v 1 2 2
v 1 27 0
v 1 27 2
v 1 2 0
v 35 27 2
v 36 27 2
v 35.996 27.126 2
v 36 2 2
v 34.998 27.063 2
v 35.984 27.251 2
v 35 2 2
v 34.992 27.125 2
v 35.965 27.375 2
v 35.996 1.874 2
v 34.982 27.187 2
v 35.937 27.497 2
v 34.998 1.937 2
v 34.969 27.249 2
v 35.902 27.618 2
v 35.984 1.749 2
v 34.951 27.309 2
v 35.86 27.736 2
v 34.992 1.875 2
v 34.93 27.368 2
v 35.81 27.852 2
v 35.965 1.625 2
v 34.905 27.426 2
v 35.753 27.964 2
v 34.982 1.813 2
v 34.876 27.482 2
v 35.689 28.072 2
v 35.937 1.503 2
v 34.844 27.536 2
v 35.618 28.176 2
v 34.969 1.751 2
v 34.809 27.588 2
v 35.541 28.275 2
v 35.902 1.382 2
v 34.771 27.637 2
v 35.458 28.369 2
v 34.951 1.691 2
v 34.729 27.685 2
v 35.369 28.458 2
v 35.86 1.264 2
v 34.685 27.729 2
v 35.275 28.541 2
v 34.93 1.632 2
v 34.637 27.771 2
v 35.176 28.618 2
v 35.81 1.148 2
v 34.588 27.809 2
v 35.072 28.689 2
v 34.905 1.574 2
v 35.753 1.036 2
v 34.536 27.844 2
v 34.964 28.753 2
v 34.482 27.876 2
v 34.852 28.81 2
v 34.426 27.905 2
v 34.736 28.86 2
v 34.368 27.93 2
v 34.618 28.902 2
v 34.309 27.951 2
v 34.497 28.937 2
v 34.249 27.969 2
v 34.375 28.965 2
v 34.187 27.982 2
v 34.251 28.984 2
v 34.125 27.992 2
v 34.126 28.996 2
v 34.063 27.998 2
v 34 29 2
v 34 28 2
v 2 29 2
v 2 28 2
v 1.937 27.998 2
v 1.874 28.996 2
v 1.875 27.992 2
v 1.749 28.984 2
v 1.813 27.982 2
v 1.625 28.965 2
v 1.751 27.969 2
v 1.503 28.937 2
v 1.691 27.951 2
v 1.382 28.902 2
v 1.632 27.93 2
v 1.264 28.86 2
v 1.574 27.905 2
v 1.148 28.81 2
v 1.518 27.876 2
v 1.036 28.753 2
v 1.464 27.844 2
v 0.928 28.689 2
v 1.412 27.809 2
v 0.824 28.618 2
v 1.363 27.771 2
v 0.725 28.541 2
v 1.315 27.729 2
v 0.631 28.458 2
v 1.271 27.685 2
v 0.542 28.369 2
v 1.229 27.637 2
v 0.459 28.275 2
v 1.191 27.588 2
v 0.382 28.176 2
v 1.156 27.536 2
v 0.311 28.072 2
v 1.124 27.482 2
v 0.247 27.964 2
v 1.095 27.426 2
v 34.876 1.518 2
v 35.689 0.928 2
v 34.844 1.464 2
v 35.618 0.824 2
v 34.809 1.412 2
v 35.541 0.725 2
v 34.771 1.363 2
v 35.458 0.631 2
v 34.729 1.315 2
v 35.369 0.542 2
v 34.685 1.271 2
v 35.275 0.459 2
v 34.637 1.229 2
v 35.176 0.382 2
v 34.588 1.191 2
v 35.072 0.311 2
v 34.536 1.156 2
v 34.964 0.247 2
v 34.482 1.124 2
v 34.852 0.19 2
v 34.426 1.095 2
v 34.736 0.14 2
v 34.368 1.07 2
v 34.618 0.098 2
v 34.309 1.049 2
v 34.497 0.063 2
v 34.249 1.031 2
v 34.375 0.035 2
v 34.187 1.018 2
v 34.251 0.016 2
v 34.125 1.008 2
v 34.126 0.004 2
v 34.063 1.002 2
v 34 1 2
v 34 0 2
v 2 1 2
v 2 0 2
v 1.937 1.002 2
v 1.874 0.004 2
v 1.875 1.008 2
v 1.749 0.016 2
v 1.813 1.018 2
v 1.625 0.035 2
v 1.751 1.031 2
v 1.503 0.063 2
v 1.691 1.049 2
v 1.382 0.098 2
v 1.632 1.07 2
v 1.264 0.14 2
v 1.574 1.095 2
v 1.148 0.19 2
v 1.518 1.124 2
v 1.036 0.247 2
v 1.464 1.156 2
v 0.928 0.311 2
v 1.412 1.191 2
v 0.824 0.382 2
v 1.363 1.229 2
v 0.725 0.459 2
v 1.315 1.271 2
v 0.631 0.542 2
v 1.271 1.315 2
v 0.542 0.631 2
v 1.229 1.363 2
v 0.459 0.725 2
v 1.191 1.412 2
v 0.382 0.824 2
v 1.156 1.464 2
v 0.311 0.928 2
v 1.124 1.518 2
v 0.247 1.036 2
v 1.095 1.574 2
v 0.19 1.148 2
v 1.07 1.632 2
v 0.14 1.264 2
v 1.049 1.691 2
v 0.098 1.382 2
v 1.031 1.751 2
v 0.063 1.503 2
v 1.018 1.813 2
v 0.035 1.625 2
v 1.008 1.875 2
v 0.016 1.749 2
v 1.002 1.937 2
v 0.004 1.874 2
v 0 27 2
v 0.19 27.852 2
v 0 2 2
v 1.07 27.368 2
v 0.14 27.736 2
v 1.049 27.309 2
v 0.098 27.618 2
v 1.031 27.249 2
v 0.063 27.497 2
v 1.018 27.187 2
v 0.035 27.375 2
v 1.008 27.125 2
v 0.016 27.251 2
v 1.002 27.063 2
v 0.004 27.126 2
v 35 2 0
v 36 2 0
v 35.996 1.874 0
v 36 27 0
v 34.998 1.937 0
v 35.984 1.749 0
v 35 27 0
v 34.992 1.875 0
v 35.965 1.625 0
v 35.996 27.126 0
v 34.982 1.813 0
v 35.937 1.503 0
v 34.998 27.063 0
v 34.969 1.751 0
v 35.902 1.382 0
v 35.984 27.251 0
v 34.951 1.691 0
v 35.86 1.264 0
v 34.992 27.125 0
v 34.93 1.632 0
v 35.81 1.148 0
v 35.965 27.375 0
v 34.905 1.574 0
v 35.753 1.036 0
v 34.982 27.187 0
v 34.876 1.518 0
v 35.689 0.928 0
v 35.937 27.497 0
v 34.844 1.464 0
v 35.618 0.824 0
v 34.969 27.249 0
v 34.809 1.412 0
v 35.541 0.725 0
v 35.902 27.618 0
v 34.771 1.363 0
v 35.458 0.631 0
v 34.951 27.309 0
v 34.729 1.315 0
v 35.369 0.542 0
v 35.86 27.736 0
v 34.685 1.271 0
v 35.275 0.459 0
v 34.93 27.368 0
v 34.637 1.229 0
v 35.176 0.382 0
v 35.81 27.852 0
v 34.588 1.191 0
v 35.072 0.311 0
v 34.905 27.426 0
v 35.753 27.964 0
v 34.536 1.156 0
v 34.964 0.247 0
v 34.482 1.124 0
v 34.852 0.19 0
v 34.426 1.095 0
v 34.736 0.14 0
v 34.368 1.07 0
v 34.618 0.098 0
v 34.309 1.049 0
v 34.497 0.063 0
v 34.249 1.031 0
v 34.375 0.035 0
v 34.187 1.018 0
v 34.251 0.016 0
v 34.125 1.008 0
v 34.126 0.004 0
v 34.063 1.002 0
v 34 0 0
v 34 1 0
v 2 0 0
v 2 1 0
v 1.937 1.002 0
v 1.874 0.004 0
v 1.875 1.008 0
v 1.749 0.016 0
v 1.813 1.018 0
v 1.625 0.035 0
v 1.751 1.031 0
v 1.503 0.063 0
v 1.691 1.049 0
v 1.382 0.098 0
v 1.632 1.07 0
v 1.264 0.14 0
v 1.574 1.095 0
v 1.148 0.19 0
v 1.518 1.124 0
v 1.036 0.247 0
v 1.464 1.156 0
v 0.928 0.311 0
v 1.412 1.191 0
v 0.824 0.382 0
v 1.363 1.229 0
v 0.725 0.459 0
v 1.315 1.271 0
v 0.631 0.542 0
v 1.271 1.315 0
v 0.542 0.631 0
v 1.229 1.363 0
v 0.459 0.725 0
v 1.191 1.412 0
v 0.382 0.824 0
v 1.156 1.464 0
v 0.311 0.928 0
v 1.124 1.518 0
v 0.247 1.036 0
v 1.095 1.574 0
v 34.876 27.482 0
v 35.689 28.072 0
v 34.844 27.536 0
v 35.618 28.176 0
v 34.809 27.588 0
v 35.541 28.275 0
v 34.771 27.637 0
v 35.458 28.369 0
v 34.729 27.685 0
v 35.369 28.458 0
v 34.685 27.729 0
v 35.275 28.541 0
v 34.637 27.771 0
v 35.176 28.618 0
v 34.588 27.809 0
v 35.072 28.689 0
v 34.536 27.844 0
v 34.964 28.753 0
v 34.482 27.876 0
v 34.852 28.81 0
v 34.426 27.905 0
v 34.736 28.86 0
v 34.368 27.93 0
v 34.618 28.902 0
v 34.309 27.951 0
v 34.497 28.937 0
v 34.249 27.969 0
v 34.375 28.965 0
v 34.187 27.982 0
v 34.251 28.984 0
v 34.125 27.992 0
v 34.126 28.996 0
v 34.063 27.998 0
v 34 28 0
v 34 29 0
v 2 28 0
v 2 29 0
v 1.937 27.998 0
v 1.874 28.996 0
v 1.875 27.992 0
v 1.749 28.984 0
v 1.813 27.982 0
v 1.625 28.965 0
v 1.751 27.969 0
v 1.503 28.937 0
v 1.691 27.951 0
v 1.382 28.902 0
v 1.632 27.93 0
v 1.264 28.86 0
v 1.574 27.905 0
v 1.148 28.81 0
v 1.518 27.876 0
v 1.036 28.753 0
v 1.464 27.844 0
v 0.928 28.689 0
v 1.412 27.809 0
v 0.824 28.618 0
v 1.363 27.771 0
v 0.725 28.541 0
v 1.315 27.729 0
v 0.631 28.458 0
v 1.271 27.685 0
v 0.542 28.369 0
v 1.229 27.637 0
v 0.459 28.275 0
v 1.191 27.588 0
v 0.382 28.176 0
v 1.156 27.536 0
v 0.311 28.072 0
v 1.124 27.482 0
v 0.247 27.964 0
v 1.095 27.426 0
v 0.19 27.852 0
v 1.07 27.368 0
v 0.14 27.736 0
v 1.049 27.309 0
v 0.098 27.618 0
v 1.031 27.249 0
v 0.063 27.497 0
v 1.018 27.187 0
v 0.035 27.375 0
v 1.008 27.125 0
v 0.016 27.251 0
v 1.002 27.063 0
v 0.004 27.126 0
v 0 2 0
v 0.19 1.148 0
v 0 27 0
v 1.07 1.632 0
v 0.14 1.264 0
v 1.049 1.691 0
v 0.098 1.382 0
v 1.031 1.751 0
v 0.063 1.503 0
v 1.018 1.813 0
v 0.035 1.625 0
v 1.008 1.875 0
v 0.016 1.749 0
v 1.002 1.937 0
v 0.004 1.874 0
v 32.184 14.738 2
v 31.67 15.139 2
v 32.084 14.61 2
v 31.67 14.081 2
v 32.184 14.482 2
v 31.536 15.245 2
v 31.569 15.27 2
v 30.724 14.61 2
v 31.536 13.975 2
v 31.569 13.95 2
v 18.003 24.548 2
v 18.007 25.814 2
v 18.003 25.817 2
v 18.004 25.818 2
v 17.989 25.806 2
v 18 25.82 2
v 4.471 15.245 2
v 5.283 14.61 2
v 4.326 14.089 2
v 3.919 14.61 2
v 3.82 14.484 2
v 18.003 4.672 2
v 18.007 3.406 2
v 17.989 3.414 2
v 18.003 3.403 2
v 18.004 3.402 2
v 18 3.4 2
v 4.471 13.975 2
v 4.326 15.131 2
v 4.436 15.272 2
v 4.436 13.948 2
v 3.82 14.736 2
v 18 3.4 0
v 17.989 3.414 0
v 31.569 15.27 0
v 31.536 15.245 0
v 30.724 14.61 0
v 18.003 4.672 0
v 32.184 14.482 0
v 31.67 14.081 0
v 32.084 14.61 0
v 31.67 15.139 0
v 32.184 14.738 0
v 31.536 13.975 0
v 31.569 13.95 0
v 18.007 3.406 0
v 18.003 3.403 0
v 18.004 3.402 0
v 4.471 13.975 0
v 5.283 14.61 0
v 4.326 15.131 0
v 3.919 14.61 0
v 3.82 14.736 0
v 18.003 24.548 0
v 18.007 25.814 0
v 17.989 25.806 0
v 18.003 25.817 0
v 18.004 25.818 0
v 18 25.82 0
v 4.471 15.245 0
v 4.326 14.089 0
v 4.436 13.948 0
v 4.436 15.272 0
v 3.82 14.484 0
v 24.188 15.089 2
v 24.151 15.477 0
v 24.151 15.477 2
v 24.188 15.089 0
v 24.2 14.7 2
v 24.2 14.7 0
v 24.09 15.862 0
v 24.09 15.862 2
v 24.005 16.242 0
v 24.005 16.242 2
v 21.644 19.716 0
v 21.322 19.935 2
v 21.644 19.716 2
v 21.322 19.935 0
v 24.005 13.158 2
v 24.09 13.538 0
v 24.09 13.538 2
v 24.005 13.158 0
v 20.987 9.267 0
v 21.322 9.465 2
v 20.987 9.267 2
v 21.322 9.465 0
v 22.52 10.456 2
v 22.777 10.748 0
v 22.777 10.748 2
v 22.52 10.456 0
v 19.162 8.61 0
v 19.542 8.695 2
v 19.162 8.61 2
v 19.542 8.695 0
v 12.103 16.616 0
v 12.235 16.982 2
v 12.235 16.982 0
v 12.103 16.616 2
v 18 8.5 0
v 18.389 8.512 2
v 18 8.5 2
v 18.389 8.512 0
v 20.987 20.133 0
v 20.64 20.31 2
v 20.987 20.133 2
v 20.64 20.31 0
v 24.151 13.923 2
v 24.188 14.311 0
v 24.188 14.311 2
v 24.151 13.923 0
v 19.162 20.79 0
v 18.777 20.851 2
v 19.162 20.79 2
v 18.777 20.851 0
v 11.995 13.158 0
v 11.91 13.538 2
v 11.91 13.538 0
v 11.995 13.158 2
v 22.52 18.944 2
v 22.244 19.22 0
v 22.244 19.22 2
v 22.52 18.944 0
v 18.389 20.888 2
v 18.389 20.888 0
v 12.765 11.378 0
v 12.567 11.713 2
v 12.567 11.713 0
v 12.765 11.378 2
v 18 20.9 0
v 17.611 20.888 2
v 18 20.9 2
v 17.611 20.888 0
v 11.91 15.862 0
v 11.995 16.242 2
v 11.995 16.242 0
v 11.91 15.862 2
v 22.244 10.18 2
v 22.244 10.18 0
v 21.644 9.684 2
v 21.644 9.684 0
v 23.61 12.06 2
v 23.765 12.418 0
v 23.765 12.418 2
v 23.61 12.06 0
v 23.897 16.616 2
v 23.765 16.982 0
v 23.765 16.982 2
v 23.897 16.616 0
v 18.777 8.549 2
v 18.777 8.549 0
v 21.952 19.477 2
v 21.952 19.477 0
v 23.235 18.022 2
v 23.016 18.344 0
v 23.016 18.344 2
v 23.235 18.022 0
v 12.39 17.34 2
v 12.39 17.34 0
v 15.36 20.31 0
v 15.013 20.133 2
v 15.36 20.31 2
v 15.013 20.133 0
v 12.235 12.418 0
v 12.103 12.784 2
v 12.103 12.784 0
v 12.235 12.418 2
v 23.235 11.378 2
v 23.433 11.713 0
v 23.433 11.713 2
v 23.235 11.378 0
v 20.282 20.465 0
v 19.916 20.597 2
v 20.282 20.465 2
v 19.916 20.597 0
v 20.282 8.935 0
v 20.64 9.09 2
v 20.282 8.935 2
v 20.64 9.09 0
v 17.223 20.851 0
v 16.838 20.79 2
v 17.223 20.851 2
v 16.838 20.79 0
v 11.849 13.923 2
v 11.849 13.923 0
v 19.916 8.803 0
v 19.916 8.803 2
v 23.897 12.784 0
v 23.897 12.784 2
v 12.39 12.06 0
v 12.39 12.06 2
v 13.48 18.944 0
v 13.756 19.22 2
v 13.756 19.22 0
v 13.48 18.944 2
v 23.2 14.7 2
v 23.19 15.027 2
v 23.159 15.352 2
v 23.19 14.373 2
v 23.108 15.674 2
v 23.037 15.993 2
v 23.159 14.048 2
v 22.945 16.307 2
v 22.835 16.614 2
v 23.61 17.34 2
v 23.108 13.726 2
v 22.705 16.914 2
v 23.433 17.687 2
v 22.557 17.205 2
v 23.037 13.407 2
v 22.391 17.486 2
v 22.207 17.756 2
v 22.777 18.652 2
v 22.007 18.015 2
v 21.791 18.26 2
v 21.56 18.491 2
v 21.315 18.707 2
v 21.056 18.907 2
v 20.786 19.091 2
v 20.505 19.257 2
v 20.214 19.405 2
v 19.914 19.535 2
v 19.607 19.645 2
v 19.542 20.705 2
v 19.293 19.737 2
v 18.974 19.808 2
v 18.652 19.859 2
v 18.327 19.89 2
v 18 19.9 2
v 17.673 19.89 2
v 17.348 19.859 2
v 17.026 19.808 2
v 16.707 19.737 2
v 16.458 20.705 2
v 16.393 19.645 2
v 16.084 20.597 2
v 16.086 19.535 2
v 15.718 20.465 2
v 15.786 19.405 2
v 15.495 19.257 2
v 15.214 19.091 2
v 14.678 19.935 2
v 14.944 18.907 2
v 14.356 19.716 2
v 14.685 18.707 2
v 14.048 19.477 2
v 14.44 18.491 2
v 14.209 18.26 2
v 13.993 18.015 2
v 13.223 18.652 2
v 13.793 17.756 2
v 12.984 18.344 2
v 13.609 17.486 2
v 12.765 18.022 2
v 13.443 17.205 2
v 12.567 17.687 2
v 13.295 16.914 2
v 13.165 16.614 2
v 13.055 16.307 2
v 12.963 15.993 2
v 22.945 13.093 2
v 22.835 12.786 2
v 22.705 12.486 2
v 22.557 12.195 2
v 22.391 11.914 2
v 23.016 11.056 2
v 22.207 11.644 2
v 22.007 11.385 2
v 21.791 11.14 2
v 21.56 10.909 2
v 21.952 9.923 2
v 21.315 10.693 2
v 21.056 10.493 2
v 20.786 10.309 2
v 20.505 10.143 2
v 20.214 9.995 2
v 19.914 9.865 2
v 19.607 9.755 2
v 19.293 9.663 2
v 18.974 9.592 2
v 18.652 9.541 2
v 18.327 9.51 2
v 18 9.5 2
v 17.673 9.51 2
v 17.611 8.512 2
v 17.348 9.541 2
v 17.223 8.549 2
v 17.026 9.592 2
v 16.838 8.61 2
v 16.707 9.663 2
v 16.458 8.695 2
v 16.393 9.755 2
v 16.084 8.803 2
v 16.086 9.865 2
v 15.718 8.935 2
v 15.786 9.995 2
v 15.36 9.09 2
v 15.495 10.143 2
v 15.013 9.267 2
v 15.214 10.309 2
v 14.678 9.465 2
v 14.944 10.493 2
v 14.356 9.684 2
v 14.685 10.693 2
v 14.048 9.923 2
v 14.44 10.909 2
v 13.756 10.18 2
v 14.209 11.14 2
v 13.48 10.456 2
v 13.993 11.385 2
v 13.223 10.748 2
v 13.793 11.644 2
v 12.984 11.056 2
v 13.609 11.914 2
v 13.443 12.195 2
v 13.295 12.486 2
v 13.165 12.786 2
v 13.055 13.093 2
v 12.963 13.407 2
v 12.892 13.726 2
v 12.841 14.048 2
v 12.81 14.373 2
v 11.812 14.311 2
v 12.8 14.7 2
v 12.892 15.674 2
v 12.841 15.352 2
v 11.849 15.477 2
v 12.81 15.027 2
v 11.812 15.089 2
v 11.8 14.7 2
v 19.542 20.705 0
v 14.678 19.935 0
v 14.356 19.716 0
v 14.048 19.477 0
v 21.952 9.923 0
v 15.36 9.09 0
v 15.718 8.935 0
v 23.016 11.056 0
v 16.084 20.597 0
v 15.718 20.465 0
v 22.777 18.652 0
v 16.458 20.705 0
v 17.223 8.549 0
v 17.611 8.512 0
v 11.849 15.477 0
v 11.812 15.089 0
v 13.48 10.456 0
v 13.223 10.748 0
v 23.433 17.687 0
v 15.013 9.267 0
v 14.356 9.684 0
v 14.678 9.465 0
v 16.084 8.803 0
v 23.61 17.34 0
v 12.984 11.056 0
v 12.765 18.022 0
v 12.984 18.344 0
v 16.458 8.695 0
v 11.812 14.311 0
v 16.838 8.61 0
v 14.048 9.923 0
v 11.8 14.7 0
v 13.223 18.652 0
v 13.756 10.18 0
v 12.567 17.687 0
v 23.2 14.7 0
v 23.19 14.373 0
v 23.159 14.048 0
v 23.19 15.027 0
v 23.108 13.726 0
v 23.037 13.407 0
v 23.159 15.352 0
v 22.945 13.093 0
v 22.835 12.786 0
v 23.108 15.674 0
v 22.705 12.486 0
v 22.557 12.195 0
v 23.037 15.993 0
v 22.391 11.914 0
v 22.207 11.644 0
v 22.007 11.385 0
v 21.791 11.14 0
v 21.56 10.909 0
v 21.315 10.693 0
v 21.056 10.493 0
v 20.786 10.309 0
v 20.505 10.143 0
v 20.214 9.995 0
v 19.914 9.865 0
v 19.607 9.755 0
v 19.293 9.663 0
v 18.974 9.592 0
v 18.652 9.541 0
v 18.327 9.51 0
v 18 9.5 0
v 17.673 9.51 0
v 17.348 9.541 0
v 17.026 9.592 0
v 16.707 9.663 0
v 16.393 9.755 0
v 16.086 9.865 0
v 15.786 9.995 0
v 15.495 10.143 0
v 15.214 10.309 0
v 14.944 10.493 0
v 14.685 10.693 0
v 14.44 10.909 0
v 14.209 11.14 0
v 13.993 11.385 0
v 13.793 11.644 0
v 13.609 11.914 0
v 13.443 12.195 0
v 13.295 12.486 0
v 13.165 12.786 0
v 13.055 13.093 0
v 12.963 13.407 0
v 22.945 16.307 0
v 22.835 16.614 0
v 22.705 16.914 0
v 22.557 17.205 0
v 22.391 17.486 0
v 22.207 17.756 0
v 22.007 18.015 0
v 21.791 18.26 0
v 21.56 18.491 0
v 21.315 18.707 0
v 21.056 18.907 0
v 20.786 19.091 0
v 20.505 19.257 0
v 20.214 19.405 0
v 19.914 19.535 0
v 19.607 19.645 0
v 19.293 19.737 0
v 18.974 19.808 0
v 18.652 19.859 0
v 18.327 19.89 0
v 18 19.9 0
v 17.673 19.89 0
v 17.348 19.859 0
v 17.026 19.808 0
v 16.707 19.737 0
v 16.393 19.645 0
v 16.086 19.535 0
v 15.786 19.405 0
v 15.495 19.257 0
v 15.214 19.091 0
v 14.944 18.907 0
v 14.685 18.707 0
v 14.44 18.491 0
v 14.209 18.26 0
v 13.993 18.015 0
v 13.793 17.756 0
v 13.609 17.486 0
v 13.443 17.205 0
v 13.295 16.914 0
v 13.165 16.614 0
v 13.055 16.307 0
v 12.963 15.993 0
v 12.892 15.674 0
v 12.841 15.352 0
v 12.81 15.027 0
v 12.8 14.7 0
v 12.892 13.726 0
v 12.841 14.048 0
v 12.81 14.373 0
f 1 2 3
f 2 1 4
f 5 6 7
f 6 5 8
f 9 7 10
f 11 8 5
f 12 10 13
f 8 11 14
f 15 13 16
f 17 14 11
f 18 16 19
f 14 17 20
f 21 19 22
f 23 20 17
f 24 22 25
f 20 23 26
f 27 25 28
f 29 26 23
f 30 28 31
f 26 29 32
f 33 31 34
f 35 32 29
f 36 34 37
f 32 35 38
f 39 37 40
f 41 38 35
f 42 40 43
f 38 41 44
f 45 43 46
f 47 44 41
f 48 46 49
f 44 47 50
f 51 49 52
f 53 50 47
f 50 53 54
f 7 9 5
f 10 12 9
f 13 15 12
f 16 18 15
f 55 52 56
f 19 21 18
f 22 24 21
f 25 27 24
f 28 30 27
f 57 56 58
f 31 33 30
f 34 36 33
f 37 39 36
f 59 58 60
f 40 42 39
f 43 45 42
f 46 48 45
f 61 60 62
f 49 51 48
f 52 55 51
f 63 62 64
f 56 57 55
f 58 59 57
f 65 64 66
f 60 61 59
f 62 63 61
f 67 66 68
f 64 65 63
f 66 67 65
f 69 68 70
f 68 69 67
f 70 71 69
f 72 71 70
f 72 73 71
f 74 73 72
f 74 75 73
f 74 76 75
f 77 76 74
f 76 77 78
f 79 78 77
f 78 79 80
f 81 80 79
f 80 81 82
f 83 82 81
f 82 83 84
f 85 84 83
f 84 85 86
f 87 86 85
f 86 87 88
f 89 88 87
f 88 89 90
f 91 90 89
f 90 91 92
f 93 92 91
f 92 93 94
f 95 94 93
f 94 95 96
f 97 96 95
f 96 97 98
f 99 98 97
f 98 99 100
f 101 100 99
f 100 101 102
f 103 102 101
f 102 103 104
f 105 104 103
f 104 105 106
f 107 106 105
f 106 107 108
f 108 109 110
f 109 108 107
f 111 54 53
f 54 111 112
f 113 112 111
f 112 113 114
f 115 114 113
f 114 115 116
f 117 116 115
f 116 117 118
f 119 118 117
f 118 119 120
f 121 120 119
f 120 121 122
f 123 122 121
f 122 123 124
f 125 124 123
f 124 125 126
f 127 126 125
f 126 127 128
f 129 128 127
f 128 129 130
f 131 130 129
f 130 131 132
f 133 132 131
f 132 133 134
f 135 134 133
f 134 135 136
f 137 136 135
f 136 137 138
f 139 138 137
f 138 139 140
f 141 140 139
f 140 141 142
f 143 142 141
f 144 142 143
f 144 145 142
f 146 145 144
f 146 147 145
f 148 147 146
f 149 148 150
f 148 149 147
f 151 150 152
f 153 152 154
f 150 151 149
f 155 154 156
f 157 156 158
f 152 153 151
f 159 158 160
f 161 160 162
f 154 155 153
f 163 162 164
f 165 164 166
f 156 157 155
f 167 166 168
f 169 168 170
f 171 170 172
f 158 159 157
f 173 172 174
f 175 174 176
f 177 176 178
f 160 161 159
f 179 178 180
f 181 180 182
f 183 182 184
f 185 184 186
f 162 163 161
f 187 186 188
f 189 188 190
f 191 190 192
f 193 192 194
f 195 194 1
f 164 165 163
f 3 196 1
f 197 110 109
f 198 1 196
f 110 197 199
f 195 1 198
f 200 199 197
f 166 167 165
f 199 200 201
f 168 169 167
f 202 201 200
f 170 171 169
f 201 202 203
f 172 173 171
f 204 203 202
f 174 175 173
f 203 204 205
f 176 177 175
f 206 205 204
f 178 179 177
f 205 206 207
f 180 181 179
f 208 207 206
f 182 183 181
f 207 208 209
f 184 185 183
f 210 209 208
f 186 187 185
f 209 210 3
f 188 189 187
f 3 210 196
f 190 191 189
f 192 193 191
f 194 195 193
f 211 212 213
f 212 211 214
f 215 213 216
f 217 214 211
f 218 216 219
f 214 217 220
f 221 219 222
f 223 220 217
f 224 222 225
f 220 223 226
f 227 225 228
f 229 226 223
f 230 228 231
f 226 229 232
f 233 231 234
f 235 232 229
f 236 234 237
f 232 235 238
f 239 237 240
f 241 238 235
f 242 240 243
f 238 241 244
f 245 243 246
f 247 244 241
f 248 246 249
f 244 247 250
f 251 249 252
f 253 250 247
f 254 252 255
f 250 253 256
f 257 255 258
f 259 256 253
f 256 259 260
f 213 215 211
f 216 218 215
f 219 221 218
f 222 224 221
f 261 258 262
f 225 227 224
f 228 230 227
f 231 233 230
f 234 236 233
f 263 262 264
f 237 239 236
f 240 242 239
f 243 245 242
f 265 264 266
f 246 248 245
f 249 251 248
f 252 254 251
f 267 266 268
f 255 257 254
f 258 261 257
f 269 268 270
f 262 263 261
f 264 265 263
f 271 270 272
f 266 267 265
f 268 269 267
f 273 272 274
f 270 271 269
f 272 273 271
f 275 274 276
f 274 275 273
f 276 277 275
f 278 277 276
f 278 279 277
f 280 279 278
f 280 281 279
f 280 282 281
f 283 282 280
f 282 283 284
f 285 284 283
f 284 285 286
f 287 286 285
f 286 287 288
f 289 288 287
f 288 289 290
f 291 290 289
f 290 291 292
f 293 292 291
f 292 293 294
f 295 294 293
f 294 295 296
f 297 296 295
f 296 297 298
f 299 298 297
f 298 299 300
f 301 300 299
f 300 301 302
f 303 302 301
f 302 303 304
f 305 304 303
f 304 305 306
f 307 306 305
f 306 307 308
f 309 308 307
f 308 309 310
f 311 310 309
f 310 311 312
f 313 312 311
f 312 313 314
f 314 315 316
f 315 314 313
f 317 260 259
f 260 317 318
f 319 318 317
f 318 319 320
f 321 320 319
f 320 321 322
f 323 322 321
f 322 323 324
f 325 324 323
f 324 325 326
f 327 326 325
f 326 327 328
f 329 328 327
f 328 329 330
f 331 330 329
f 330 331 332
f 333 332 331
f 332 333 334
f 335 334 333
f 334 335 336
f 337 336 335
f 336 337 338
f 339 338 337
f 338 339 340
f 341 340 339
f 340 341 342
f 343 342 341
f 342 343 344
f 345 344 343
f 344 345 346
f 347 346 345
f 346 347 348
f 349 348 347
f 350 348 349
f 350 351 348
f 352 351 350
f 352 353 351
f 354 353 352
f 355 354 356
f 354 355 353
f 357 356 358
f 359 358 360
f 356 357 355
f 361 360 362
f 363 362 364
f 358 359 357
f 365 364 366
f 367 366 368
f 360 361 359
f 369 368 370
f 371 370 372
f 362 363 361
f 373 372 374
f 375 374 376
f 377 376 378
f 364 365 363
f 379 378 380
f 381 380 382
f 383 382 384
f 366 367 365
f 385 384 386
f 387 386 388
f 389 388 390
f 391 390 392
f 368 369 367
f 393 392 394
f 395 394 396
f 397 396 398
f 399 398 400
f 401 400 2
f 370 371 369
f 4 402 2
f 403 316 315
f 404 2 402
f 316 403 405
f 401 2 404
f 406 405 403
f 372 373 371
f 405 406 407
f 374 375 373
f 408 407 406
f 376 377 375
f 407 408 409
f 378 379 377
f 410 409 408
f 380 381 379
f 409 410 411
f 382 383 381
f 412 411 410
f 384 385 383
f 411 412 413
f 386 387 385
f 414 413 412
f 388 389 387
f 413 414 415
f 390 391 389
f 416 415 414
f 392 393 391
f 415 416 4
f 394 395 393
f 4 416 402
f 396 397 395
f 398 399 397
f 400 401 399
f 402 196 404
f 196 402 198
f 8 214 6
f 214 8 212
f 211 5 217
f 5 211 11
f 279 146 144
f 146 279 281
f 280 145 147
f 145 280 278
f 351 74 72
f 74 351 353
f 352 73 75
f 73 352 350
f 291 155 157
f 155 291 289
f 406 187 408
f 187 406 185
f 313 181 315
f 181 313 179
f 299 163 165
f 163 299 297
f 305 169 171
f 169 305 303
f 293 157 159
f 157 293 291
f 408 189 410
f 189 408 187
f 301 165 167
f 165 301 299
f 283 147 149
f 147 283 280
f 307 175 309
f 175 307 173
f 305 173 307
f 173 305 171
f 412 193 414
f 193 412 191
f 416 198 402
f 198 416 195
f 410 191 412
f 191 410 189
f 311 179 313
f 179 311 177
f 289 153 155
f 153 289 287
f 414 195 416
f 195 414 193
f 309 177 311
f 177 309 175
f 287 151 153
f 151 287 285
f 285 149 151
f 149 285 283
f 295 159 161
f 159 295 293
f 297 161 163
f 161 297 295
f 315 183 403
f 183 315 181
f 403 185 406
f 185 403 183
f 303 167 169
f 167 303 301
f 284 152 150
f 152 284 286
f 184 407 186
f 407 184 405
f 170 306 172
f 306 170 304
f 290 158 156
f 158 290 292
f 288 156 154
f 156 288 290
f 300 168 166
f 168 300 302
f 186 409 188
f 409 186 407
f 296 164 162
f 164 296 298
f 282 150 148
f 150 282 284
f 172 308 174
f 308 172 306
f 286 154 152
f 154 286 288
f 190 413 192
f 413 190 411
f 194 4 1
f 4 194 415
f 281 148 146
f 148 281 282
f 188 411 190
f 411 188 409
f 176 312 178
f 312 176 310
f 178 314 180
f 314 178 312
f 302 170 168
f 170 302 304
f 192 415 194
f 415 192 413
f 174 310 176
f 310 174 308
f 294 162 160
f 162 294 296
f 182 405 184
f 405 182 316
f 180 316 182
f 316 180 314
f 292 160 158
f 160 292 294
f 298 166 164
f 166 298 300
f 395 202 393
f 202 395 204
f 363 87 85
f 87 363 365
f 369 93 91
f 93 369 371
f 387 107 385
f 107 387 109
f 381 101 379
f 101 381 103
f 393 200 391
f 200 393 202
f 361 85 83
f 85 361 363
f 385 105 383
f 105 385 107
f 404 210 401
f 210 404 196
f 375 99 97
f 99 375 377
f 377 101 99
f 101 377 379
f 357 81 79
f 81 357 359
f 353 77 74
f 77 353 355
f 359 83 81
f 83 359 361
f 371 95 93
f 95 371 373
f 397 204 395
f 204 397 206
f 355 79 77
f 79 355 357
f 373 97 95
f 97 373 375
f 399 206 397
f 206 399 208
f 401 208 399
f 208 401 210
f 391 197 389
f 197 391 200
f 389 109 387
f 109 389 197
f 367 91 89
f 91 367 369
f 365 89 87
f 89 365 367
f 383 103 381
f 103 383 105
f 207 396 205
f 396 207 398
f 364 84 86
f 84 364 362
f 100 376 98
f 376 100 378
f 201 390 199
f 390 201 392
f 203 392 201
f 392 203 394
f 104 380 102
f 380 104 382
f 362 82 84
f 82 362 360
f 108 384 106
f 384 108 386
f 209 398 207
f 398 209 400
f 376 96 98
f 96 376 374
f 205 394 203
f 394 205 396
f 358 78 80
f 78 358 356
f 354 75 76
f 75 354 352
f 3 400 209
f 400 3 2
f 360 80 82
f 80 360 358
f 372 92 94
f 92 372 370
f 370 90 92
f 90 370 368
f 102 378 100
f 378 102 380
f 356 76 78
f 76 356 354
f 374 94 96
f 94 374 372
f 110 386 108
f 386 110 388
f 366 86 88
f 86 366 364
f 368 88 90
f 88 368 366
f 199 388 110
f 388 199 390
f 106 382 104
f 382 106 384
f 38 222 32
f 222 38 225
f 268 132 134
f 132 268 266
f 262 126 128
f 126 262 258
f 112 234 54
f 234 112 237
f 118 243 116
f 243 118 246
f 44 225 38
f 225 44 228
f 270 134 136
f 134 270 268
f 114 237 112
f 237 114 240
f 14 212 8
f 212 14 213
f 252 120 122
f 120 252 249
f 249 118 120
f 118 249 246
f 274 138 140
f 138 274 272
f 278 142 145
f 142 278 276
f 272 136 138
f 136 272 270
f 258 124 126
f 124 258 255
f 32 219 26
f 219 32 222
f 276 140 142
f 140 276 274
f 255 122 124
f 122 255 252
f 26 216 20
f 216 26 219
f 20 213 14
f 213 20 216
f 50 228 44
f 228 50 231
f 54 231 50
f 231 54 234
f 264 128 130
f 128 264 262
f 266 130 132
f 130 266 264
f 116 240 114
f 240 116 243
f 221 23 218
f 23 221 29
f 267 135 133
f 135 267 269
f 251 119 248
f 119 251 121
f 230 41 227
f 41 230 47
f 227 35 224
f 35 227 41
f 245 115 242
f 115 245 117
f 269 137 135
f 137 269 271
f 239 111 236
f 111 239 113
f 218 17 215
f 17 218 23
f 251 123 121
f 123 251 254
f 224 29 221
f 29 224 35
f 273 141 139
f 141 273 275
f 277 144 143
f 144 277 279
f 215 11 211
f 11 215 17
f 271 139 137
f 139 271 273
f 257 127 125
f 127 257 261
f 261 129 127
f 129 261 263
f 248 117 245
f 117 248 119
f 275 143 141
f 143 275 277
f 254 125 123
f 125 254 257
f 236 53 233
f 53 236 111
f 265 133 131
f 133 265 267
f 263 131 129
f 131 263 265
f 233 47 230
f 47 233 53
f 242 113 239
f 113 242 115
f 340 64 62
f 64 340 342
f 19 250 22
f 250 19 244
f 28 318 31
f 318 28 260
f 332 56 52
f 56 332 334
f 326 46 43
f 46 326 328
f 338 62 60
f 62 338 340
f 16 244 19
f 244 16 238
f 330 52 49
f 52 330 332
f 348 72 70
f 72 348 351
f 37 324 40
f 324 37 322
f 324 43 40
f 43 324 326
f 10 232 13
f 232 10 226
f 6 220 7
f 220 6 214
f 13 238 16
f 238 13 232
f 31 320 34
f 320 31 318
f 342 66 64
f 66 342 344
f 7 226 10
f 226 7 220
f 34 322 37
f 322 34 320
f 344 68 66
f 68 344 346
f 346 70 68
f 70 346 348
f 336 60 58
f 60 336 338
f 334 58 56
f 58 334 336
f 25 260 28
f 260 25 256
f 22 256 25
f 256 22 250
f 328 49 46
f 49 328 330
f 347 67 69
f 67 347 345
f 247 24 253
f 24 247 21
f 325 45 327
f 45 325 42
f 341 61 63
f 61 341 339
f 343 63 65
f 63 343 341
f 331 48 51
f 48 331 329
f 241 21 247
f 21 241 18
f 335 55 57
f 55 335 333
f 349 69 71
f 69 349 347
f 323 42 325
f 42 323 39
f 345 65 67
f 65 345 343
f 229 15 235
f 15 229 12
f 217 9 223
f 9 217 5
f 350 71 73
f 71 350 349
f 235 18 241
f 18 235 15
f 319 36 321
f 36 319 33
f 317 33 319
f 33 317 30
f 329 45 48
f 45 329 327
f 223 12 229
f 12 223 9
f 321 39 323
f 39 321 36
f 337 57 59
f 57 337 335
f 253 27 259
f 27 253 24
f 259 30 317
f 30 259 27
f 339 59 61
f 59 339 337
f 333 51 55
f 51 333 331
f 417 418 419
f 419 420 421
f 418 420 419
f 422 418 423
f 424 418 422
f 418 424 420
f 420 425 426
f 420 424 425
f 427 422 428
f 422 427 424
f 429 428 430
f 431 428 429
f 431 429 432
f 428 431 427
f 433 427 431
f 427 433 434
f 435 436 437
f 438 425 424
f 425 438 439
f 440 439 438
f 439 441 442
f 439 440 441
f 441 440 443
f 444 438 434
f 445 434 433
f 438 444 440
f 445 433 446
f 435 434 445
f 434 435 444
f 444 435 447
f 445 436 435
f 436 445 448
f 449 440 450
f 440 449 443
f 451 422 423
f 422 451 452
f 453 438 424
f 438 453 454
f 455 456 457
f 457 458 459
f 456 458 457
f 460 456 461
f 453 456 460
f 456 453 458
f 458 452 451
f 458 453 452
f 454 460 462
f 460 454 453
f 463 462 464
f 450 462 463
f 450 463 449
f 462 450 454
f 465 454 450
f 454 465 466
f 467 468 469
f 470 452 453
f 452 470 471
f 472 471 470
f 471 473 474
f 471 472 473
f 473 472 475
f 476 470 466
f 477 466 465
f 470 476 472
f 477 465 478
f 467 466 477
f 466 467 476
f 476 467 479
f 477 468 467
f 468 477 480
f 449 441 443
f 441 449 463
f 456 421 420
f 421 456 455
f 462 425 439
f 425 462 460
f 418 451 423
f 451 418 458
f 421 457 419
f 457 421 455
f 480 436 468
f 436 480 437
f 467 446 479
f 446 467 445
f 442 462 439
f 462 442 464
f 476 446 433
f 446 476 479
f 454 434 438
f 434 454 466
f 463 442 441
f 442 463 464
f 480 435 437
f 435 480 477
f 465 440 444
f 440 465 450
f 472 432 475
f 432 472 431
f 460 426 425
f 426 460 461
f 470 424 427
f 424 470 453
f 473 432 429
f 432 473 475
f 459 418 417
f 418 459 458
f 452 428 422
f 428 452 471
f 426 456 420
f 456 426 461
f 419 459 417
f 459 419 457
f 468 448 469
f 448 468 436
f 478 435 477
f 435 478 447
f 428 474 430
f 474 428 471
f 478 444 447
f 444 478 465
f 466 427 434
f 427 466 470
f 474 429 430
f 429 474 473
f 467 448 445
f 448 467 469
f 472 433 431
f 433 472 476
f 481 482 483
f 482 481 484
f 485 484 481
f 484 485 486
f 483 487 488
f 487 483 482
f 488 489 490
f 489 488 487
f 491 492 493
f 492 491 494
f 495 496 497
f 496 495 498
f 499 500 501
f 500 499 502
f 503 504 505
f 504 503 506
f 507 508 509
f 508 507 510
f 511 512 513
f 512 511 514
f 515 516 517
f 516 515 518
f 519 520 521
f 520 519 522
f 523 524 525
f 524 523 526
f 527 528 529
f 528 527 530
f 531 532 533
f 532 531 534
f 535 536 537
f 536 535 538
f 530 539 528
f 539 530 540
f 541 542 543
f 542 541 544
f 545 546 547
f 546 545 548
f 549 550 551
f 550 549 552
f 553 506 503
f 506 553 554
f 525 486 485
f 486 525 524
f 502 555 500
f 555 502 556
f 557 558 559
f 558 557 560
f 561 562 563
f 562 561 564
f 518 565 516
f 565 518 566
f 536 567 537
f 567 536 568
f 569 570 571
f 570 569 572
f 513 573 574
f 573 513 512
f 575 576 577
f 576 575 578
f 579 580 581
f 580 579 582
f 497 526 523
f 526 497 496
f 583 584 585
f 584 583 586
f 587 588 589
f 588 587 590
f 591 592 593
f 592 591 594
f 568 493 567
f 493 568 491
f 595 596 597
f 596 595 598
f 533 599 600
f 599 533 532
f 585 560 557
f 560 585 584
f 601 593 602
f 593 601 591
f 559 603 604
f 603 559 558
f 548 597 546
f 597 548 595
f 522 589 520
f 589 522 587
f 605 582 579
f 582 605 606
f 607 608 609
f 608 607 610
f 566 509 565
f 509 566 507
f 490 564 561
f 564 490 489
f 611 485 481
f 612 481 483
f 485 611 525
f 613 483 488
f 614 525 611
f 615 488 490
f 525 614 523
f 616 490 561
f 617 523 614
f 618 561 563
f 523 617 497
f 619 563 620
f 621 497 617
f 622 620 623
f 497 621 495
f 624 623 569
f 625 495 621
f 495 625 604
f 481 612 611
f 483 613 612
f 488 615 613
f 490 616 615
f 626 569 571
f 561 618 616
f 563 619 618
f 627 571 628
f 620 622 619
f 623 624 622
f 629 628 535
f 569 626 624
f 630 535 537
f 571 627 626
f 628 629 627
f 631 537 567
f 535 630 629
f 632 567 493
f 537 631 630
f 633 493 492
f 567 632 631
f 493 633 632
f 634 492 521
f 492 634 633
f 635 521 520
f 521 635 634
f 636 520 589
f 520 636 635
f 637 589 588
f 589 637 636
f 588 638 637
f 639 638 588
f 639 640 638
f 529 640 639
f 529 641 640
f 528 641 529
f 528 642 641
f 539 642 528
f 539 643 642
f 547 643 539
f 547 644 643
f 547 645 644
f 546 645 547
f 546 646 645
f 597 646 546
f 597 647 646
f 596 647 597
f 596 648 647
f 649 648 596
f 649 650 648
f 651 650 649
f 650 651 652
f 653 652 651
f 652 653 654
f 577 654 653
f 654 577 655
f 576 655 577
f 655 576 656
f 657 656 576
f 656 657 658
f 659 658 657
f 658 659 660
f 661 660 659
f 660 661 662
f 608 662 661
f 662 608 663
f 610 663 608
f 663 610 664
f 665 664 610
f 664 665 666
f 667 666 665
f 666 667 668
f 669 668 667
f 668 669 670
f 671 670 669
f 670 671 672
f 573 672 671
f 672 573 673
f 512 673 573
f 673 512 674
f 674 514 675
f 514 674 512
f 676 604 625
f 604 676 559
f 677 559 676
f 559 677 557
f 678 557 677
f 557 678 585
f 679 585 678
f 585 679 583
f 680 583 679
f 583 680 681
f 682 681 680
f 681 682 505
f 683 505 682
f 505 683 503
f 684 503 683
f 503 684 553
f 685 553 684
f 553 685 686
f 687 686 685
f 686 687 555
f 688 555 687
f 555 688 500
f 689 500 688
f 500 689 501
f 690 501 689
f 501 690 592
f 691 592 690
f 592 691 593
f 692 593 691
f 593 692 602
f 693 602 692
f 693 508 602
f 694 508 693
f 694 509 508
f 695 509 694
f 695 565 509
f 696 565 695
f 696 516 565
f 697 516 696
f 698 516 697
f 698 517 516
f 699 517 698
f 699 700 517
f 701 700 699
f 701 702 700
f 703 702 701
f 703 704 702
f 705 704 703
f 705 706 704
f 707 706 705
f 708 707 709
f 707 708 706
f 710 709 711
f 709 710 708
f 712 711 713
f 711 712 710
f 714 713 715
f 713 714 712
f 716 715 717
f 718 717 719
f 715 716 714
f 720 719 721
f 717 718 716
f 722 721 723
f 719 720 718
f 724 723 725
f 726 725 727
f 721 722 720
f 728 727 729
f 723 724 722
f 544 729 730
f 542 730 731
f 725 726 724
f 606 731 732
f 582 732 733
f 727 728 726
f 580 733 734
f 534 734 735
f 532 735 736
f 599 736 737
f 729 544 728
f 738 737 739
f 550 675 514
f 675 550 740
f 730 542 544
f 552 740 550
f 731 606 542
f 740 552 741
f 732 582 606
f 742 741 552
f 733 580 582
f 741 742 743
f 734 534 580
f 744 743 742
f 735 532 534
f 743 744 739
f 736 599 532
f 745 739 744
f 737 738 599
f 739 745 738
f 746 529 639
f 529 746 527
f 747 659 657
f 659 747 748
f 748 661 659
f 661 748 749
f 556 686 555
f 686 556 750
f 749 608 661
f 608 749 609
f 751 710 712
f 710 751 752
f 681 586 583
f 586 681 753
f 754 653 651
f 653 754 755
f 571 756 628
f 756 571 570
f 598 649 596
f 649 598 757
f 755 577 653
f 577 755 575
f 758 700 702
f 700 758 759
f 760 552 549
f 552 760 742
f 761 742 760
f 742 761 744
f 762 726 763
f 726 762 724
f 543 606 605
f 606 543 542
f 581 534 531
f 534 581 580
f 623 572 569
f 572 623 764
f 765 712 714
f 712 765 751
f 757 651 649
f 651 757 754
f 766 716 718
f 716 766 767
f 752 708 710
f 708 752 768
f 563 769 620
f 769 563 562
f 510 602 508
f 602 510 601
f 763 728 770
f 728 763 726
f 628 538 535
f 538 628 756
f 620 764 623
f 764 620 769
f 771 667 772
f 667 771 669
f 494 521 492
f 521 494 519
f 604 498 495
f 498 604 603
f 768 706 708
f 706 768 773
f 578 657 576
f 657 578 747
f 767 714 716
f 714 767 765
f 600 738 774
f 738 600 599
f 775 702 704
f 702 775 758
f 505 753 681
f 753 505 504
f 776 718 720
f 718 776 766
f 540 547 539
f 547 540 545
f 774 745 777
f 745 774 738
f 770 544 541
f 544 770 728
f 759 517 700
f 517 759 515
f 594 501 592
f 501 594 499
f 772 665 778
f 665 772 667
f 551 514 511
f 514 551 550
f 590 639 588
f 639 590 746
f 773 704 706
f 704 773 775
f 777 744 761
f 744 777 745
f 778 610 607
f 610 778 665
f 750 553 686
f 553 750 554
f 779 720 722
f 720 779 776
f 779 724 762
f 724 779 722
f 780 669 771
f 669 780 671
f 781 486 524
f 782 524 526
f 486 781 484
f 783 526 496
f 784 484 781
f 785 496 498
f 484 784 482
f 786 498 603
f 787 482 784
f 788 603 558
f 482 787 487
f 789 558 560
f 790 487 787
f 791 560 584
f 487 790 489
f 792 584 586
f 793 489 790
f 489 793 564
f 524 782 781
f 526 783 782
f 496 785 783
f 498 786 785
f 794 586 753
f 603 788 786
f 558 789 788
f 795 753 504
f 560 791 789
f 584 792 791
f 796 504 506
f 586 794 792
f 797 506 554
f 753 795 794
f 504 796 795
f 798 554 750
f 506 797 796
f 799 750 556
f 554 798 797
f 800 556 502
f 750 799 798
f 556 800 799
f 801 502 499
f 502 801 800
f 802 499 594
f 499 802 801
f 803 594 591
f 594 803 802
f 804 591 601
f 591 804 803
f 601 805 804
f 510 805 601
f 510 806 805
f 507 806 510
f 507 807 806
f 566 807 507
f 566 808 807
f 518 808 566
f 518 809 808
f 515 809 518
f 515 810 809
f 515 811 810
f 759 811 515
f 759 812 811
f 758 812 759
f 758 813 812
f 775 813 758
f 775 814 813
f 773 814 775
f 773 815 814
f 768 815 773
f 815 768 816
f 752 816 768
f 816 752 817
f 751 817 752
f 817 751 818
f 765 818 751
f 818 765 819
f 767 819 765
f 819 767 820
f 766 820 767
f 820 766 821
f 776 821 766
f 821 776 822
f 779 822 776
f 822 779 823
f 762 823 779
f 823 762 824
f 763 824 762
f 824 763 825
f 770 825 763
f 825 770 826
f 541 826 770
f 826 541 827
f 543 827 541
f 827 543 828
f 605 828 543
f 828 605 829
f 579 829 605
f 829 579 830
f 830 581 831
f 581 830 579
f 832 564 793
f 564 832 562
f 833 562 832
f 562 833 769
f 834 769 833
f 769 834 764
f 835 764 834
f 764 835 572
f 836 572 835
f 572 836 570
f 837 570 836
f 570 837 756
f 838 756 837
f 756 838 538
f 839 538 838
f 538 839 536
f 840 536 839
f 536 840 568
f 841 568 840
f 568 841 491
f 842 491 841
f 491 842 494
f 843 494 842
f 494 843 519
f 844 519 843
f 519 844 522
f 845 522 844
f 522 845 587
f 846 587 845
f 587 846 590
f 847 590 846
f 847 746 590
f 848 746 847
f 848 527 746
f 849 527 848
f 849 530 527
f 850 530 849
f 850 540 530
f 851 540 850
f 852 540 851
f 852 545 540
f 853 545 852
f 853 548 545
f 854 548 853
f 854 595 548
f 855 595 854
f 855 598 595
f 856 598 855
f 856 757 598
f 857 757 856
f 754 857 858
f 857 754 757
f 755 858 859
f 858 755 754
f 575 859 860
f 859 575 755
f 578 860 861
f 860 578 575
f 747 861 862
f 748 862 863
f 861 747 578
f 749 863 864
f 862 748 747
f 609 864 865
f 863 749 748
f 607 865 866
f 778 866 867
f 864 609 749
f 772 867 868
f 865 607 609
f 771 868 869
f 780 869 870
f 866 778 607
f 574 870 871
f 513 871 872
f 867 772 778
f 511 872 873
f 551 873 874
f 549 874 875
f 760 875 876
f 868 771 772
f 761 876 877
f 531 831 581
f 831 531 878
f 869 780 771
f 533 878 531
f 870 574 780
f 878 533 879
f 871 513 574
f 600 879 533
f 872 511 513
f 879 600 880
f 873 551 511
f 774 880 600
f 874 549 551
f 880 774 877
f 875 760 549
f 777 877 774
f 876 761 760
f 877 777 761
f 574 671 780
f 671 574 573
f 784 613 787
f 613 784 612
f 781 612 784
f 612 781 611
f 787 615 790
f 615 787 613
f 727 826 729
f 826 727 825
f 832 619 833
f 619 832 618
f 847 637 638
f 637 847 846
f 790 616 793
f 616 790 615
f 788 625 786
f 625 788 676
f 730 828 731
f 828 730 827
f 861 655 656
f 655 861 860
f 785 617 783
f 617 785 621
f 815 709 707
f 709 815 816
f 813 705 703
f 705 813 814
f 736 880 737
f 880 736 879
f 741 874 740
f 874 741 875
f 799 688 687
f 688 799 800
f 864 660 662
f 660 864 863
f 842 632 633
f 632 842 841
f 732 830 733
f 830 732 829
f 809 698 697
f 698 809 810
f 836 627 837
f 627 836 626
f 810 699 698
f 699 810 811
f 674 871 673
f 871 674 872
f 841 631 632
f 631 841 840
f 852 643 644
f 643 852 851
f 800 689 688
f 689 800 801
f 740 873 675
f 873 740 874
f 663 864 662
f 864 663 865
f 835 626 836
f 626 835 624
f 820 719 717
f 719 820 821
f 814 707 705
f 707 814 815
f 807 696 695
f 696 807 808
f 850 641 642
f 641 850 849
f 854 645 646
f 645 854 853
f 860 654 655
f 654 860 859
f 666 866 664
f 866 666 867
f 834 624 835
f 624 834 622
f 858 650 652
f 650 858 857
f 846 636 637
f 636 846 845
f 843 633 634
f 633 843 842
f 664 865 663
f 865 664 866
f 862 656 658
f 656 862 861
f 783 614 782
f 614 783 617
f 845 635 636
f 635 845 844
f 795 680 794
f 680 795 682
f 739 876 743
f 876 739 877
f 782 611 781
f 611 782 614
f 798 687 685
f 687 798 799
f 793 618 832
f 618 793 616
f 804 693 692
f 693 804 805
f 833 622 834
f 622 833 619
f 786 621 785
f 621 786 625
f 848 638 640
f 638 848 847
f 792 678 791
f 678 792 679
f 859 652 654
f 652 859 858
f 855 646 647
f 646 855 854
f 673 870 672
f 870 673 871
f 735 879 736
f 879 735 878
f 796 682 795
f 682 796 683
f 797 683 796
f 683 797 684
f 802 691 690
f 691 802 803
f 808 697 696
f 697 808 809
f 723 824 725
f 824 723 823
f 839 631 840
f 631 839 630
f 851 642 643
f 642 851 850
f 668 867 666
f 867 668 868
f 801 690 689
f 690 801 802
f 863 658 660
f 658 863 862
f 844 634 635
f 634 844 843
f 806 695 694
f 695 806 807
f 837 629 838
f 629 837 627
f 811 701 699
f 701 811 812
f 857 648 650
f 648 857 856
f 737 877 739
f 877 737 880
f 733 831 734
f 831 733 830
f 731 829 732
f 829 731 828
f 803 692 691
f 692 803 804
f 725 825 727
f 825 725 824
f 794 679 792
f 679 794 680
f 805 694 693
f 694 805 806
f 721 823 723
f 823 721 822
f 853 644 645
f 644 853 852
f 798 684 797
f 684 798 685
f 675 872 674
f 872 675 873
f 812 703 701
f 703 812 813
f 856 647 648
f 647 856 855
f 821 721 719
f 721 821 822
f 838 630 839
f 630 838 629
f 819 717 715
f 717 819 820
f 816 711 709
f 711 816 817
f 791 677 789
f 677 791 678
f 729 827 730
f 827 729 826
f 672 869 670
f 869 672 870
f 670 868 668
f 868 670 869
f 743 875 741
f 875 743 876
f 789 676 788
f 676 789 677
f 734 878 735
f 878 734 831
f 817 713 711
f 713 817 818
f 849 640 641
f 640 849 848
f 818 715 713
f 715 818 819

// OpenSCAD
/*****************************

		Brazilian flag

*****************************/


// flag 36mm x 29mm

module sides() {
	// left side 29 - 2 * 2
	translate([0,2,0])
	cube([1, 25, 2]);
	// right side
	translate([35,2,0])
	cube([1, 25, 2]);
	// bottom 36 - 2 * 2
	translate([2,0,0])
	cube([32, 1, 2]);
	// top
	translate([2,28,0])
	cube([32, 1, 2]);
}

// corner
module corner() {
	difference() {
		cylinder(h = 2, r1 = 2, r2 = 2, $fn = 100);
		cylinder(h = 2, r1 = 1, r2 = 1, $fn = 100);
		translate([-2,0,0])
		cube([2,2,2]);
		translate([0,-2,0])
		cube([2,4,2]);
	}
}

module bl_corner() {
	corner();
}

module tl_corner() {
	rotate([0,0,-90])
	corner();
}

module br_corner() {
	rotate([0,0,90])
	corner();
}

module tr_corner() {
	rotate([0,0,180])
	corner();
}

module corners() {
	translate([2,2,0])
	bl_corner();

	translate([2,27,0])
	tl_corner();

	translate([34,2,0])
	br_corner();

	translate([34,27,0])
	tr_corner();
}

module rhombus_side() {
	cube([18,1,2]);
}

module bottom_half() {
	rotate([0,0,38])
	rhombus_side();
	translate([0.62,0.79,0])
	rotate([0,0,142])
	rhombus_side();
}

module top_half() {
	translate([0,22.42,2])
	rotate([180,0,0])
	bottom_half();
}

module rhombus() {
	top_half();
	bottom_half();
}

module circle() {
	translate([0,11.3,0])
	difference() {
		cylinder(h = 2, r1 = 6.2, r2 = 6.2, $fn = 100);
		cylinder(h = 2, r1 = 5.2, r2 = 5.2, $fn = 100);
	}
}

module rhombus_and_circle() {
	rhombus();
	circle();
}

module render() {
	sides();
	corners();
	translate([18,3.4,0])
	rhombus_and_circle();
}

render();
